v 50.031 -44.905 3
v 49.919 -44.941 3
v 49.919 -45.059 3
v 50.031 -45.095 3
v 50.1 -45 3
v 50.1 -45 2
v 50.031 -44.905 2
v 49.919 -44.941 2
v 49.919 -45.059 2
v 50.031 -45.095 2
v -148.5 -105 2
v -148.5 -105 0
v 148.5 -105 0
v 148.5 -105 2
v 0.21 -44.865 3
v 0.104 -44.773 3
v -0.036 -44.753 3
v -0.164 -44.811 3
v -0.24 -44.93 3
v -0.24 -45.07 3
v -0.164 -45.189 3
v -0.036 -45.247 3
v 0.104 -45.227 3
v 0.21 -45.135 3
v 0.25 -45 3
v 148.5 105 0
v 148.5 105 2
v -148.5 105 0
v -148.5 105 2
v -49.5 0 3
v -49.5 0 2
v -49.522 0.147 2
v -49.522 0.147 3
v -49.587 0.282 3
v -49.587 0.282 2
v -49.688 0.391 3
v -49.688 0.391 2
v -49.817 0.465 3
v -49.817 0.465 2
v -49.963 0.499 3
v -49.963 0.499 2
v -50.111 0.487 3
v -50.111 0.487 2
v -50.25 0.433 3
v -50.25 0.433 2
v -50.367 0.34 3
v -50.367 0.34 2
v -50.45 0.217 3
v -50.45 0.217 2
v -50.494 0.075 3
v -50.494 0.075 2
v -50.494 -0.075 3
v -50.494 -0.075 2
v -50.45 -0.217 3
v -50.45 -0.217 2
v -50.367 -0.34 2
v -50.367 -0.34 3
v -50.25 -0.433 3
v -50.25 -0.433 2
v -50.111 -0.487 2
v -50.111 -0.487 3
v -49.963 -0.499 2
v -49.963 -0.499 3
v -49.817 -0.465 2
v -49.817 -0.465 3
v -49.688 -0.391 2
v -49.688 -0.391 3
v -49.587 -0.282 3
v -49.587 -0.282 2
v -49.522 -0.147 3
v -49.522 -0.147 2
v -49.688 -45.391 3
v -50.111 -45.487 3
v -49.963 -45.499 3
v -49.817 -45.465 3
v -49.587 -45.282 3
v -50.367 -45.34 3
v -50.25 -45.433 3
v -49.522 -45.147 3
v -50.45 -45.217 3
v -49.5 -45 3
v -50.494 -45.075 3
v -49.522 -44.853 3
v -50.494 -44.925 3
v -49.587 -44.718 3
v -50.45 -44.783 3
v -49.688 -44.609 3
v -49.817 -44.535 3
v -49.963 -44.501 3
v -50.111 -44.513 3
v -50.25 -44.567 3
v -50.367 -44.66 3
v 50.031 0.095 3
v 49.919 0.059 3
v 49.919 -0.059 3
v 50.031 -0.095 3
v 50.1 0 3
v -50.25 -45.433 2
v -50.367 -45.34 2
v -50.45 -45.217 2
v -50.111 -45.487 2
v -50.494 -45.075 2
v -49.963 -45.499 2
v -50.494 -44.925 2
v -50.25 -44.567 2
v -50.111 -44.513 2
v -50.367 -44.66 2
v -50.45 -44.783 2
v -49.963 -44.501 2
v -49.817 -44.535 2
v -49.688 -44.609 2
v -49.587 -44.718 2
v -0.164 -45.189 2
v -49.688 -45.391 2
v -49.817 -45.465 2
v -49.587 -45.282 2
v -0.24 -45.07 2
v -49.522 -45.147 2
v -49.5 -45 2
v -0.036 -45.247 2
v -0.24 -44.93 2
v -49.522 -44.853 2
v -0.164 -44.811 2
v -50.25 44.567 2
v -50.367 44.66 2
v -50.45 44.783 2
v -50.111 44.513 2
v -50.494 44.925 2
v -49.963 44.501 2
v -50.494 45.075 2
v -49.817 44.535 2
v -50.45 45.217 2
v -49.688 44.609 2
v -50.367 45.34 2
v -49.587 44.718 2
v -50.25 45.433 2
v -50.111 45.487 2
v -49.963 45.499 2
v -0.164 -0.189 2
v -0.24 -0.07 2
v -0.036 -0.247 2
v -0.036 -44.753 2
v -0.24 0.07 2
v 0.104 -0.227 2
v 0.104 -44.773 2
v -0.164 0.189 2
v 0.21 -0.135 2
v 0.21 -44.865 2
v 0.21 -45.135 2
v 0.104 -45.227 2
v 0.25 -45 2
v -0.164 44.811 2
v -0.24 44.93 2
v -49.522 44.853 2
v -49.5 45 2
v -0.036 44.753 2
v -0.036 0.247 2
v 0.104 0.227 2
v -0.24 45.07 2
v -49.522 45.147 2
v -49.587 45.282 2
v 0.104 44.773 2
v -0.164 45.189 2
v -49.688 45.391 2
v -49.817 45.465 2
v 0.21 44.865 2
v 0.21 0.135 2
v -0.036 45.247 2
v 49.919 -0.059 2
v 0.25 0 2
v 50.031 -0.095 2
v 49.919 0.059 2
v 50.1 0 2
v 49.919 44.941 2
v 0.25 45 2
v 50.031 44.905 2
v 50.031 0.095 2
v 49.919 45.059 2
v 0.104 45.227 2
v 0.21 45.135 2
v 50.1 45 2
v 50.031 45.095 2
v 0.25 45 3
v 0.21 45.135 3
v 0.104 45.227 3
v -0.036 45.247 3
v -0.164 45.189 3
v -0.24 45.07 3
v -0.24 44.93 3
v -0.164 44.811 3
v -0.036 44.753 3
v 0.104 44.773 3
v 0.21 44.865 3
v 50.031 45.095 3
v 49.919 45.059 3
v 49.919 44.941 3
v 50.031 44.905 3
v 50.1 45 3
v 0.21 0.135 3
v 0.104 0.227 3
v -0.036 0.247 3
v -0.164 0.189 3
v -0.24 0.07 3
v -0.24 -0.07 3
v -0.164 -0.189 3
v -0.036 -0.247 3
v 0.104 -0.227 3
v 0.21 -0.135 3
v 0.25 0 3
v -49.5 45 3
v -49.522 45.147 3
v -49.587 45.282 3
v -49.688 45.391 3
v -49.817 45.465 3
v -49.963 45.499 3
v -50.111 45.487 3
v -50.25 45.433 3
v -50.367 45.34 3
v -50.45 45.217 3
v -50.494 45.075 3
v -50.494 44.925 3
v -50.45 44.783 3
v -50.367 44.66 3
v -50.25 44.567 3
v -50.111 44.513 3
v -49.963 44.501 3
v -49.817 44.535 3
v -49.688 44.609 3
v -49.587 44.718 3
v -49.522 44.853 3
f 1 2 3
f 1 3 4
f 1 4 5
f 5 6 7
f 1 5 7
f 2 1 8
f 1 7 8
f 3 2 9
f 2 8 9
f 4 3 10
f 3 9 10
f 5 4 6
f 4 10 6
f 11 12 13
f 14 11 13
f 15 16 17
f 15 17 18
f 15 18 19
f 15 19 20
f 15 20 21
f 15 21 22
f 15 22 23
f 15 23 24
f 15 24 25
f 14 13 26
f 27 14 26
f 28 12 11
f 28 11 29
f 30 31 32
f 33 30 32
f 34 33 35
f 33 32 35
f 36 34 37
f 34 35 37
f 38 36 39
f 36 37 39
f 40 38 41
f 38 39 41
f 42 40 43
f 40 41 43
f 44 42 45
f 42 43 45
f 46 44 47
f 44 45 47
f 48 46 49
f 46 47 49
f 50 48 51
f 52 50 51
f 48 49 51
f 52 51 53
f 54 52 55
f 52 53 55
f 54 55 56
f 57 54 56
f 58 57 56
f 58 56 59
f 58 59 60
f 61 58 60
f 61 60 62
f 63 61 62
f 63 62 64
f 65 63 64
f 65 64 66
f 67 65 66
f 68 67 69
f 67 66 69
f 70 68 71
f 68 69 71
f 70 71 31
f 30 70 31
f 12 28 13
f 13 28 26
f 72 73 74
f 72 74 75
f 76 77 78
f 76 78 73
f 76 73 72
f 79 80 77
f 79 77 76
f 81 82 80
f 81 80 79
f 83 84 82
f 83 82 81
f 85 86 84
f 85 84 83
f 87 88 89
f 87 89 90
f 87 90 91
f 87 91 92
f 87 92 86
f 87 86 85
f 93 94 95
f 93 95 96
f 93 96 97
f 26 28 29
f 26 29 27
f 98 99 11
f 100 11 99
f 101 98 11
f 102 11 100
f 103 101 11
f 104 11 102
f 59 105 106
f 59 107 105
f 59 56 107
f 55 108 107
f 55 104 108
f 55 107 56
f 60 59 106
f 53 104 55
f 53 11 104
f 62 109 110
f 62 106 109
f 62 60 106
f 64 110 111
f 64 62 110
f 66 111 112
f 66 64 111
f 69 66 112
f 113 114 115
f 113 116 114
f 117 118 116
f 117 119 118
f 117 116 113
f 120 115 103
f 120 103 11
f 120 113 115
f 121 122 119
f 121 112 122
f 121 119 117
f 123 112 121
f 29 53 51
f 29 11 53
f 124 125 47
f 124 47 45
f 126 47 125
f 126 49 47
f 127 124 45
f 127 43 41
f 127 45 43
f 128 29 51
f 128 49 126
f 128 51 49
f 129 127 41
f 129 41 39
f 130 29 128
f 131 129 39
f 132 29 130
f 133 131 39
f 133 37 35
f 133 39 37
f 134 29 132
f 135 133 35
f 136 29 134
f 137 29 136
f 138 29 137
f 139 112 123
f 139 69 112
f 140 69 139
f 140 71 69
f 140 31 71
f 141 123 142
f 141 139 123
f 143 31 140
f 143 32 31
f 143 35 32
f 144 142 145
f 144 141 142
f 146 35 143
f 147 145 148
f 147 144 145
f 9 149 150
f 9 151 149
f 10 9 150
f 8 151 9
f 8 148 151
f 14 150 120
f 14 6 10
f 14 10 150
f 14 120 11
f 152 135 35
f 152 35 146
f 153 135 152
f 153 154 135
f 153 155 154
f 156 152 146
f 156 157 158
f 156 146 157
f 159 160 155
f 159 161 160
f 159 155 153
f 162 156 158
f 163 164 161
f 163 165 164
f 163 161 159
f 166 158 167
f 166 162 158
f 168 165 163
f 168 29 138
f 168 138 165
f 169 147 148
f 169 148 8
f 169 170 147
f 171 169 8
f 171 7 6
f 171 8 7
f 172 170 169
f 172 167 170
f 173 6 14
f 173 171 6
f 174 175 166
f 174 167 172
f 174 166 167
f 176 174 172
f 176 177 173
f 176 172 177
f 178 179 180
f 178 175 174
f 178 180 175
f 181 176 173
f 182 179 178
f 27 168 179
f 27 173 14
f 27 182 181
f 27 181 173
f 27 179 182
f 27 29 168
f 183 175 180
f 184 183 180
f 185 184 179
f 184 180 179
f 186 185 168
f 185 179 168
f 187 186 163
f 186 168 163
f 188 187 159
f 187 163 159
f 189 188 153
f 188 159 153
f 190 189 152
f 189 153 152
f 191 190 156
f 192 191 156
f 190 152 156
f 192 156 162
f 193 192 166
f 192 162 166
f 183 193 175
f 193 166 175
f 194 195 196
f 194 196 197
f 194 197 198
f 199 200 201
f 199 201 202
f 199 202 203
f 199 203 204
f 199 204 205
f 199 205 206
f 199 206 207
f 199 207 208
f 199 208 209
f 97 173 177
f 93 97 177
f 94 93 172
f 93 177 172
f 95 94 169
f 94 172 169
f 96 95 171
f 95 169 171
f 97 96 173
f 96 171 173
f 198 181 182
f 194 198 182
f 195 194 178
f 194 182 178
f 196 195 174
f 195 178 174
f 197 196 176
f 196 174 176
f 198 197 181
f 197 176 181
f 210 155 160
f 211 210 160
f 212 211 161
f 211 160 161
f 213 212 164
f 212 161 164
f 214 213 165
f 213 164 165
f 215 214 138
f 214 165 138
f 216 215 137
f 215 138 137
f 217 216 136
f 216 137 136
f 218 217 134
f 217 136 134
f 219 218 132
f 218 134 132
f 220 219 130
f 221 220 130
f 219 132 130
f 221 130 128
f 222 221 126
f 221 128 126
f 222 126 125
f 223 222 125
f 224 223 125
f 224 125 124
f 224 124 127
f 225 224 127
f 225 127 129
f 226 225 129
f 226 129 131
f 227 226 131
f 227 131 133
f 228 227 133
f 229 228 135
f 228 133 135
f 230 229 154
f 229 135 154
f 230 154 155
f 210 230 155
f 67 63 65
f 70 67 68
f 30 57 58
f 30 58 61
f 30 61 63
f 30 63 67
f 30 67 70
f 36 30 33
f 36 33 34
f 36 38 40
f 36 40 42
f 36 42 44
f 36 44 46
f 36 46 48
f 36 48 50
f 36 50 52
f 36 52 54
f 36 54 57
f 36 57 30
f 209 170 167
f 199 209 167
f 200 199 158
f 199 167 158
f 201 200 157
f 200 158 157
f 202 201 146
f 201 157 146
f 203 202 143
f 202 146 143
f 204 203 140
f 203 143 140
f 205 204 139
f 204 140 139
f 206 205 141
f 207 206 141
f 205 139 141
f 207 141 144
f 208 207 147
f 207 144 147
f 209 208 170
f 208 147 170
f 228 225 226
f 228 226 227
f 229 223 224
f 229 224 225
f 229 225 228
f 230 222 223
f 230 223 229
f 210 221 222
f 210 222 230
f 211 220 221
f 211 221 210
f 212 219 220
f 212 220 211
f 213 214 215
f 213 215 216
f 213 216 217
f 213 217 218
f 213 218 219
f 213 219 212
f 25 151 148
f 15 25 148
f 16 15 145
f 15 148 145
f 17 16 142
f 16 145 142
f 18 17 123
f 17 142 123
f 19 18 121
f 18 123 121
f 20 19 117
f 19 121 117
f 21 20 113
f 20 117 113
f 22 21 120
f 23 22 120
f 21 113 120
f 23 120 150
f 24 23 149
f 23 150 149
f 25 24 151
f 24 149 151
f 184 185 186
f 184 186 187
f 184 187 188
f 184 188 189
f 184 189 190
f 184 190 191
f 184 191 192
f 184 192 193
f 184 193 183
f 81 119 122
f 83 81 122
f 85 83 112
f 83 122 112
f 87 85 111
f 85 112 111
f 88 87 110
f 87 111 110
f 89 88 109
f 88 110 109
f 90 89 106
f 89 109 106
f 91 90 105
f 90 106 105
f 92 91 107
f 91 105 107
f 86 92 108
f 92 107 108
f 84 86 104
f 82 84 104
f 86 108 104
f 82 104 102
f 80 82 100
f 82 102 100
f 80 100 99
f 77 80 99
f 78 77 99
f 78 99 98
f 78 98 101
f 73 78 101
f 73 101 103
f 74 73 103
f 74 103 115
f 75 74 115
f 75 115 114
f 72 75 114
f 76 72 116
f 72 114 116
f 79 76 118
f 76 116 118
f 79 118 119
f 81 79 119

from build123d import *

# Parameters (mm, degrees)
F0_W     = 297
F0_H     = 210
F1_DEPTH = 2
F2_R     = 0.1
F3_DEPTH = 1
F4_R     = 0.25
F5_DEPTH = 1
F6_R     = 0.5
F7_DEPTH = 1


with BuildPart() as f1:
    # F0 (on Top) → F1 (new body)
    with BuildSketch(Plane.XY):
        Rectangle(F0_W, F0_H)
    extrude(amount=F1_DEPTH)

    # F2 (on face) → F3 (join)
    with BuildSketch(Plane.XY.offset(2)):
        with Locations((50, 45)):
            Circle(F2_R)
        with Locations((50, 0)):
            Circle(F2_R)
        with Locations((50, -45)):
            Circle(F2_R)
    extrude(amount=F3_DEPTH)

    # F4 (on face) → F5 (join)
    with BuildSketch(Plane.XY.offset(2)):
        with Locations((0, 45)):
            Circle(F4_R)
        Circle(F4_R)
        with Locations((0, -45)):
            Circle(F4_R)
    extrude(amount=F5_DEPTH)

    # F6 (on face) → F7 (join)
    with BuildSketch(Plane.XY.offset(2)):
        with Locations((-50, 45)):
            Circle(F6_R)
        with Locations((-50, 0)):
            Circle(F6_R)
        with Locations((-50, -45)):
            Circle(F6_R)
    extrude(amount=F7_DEPTH)


solid = f1.part
